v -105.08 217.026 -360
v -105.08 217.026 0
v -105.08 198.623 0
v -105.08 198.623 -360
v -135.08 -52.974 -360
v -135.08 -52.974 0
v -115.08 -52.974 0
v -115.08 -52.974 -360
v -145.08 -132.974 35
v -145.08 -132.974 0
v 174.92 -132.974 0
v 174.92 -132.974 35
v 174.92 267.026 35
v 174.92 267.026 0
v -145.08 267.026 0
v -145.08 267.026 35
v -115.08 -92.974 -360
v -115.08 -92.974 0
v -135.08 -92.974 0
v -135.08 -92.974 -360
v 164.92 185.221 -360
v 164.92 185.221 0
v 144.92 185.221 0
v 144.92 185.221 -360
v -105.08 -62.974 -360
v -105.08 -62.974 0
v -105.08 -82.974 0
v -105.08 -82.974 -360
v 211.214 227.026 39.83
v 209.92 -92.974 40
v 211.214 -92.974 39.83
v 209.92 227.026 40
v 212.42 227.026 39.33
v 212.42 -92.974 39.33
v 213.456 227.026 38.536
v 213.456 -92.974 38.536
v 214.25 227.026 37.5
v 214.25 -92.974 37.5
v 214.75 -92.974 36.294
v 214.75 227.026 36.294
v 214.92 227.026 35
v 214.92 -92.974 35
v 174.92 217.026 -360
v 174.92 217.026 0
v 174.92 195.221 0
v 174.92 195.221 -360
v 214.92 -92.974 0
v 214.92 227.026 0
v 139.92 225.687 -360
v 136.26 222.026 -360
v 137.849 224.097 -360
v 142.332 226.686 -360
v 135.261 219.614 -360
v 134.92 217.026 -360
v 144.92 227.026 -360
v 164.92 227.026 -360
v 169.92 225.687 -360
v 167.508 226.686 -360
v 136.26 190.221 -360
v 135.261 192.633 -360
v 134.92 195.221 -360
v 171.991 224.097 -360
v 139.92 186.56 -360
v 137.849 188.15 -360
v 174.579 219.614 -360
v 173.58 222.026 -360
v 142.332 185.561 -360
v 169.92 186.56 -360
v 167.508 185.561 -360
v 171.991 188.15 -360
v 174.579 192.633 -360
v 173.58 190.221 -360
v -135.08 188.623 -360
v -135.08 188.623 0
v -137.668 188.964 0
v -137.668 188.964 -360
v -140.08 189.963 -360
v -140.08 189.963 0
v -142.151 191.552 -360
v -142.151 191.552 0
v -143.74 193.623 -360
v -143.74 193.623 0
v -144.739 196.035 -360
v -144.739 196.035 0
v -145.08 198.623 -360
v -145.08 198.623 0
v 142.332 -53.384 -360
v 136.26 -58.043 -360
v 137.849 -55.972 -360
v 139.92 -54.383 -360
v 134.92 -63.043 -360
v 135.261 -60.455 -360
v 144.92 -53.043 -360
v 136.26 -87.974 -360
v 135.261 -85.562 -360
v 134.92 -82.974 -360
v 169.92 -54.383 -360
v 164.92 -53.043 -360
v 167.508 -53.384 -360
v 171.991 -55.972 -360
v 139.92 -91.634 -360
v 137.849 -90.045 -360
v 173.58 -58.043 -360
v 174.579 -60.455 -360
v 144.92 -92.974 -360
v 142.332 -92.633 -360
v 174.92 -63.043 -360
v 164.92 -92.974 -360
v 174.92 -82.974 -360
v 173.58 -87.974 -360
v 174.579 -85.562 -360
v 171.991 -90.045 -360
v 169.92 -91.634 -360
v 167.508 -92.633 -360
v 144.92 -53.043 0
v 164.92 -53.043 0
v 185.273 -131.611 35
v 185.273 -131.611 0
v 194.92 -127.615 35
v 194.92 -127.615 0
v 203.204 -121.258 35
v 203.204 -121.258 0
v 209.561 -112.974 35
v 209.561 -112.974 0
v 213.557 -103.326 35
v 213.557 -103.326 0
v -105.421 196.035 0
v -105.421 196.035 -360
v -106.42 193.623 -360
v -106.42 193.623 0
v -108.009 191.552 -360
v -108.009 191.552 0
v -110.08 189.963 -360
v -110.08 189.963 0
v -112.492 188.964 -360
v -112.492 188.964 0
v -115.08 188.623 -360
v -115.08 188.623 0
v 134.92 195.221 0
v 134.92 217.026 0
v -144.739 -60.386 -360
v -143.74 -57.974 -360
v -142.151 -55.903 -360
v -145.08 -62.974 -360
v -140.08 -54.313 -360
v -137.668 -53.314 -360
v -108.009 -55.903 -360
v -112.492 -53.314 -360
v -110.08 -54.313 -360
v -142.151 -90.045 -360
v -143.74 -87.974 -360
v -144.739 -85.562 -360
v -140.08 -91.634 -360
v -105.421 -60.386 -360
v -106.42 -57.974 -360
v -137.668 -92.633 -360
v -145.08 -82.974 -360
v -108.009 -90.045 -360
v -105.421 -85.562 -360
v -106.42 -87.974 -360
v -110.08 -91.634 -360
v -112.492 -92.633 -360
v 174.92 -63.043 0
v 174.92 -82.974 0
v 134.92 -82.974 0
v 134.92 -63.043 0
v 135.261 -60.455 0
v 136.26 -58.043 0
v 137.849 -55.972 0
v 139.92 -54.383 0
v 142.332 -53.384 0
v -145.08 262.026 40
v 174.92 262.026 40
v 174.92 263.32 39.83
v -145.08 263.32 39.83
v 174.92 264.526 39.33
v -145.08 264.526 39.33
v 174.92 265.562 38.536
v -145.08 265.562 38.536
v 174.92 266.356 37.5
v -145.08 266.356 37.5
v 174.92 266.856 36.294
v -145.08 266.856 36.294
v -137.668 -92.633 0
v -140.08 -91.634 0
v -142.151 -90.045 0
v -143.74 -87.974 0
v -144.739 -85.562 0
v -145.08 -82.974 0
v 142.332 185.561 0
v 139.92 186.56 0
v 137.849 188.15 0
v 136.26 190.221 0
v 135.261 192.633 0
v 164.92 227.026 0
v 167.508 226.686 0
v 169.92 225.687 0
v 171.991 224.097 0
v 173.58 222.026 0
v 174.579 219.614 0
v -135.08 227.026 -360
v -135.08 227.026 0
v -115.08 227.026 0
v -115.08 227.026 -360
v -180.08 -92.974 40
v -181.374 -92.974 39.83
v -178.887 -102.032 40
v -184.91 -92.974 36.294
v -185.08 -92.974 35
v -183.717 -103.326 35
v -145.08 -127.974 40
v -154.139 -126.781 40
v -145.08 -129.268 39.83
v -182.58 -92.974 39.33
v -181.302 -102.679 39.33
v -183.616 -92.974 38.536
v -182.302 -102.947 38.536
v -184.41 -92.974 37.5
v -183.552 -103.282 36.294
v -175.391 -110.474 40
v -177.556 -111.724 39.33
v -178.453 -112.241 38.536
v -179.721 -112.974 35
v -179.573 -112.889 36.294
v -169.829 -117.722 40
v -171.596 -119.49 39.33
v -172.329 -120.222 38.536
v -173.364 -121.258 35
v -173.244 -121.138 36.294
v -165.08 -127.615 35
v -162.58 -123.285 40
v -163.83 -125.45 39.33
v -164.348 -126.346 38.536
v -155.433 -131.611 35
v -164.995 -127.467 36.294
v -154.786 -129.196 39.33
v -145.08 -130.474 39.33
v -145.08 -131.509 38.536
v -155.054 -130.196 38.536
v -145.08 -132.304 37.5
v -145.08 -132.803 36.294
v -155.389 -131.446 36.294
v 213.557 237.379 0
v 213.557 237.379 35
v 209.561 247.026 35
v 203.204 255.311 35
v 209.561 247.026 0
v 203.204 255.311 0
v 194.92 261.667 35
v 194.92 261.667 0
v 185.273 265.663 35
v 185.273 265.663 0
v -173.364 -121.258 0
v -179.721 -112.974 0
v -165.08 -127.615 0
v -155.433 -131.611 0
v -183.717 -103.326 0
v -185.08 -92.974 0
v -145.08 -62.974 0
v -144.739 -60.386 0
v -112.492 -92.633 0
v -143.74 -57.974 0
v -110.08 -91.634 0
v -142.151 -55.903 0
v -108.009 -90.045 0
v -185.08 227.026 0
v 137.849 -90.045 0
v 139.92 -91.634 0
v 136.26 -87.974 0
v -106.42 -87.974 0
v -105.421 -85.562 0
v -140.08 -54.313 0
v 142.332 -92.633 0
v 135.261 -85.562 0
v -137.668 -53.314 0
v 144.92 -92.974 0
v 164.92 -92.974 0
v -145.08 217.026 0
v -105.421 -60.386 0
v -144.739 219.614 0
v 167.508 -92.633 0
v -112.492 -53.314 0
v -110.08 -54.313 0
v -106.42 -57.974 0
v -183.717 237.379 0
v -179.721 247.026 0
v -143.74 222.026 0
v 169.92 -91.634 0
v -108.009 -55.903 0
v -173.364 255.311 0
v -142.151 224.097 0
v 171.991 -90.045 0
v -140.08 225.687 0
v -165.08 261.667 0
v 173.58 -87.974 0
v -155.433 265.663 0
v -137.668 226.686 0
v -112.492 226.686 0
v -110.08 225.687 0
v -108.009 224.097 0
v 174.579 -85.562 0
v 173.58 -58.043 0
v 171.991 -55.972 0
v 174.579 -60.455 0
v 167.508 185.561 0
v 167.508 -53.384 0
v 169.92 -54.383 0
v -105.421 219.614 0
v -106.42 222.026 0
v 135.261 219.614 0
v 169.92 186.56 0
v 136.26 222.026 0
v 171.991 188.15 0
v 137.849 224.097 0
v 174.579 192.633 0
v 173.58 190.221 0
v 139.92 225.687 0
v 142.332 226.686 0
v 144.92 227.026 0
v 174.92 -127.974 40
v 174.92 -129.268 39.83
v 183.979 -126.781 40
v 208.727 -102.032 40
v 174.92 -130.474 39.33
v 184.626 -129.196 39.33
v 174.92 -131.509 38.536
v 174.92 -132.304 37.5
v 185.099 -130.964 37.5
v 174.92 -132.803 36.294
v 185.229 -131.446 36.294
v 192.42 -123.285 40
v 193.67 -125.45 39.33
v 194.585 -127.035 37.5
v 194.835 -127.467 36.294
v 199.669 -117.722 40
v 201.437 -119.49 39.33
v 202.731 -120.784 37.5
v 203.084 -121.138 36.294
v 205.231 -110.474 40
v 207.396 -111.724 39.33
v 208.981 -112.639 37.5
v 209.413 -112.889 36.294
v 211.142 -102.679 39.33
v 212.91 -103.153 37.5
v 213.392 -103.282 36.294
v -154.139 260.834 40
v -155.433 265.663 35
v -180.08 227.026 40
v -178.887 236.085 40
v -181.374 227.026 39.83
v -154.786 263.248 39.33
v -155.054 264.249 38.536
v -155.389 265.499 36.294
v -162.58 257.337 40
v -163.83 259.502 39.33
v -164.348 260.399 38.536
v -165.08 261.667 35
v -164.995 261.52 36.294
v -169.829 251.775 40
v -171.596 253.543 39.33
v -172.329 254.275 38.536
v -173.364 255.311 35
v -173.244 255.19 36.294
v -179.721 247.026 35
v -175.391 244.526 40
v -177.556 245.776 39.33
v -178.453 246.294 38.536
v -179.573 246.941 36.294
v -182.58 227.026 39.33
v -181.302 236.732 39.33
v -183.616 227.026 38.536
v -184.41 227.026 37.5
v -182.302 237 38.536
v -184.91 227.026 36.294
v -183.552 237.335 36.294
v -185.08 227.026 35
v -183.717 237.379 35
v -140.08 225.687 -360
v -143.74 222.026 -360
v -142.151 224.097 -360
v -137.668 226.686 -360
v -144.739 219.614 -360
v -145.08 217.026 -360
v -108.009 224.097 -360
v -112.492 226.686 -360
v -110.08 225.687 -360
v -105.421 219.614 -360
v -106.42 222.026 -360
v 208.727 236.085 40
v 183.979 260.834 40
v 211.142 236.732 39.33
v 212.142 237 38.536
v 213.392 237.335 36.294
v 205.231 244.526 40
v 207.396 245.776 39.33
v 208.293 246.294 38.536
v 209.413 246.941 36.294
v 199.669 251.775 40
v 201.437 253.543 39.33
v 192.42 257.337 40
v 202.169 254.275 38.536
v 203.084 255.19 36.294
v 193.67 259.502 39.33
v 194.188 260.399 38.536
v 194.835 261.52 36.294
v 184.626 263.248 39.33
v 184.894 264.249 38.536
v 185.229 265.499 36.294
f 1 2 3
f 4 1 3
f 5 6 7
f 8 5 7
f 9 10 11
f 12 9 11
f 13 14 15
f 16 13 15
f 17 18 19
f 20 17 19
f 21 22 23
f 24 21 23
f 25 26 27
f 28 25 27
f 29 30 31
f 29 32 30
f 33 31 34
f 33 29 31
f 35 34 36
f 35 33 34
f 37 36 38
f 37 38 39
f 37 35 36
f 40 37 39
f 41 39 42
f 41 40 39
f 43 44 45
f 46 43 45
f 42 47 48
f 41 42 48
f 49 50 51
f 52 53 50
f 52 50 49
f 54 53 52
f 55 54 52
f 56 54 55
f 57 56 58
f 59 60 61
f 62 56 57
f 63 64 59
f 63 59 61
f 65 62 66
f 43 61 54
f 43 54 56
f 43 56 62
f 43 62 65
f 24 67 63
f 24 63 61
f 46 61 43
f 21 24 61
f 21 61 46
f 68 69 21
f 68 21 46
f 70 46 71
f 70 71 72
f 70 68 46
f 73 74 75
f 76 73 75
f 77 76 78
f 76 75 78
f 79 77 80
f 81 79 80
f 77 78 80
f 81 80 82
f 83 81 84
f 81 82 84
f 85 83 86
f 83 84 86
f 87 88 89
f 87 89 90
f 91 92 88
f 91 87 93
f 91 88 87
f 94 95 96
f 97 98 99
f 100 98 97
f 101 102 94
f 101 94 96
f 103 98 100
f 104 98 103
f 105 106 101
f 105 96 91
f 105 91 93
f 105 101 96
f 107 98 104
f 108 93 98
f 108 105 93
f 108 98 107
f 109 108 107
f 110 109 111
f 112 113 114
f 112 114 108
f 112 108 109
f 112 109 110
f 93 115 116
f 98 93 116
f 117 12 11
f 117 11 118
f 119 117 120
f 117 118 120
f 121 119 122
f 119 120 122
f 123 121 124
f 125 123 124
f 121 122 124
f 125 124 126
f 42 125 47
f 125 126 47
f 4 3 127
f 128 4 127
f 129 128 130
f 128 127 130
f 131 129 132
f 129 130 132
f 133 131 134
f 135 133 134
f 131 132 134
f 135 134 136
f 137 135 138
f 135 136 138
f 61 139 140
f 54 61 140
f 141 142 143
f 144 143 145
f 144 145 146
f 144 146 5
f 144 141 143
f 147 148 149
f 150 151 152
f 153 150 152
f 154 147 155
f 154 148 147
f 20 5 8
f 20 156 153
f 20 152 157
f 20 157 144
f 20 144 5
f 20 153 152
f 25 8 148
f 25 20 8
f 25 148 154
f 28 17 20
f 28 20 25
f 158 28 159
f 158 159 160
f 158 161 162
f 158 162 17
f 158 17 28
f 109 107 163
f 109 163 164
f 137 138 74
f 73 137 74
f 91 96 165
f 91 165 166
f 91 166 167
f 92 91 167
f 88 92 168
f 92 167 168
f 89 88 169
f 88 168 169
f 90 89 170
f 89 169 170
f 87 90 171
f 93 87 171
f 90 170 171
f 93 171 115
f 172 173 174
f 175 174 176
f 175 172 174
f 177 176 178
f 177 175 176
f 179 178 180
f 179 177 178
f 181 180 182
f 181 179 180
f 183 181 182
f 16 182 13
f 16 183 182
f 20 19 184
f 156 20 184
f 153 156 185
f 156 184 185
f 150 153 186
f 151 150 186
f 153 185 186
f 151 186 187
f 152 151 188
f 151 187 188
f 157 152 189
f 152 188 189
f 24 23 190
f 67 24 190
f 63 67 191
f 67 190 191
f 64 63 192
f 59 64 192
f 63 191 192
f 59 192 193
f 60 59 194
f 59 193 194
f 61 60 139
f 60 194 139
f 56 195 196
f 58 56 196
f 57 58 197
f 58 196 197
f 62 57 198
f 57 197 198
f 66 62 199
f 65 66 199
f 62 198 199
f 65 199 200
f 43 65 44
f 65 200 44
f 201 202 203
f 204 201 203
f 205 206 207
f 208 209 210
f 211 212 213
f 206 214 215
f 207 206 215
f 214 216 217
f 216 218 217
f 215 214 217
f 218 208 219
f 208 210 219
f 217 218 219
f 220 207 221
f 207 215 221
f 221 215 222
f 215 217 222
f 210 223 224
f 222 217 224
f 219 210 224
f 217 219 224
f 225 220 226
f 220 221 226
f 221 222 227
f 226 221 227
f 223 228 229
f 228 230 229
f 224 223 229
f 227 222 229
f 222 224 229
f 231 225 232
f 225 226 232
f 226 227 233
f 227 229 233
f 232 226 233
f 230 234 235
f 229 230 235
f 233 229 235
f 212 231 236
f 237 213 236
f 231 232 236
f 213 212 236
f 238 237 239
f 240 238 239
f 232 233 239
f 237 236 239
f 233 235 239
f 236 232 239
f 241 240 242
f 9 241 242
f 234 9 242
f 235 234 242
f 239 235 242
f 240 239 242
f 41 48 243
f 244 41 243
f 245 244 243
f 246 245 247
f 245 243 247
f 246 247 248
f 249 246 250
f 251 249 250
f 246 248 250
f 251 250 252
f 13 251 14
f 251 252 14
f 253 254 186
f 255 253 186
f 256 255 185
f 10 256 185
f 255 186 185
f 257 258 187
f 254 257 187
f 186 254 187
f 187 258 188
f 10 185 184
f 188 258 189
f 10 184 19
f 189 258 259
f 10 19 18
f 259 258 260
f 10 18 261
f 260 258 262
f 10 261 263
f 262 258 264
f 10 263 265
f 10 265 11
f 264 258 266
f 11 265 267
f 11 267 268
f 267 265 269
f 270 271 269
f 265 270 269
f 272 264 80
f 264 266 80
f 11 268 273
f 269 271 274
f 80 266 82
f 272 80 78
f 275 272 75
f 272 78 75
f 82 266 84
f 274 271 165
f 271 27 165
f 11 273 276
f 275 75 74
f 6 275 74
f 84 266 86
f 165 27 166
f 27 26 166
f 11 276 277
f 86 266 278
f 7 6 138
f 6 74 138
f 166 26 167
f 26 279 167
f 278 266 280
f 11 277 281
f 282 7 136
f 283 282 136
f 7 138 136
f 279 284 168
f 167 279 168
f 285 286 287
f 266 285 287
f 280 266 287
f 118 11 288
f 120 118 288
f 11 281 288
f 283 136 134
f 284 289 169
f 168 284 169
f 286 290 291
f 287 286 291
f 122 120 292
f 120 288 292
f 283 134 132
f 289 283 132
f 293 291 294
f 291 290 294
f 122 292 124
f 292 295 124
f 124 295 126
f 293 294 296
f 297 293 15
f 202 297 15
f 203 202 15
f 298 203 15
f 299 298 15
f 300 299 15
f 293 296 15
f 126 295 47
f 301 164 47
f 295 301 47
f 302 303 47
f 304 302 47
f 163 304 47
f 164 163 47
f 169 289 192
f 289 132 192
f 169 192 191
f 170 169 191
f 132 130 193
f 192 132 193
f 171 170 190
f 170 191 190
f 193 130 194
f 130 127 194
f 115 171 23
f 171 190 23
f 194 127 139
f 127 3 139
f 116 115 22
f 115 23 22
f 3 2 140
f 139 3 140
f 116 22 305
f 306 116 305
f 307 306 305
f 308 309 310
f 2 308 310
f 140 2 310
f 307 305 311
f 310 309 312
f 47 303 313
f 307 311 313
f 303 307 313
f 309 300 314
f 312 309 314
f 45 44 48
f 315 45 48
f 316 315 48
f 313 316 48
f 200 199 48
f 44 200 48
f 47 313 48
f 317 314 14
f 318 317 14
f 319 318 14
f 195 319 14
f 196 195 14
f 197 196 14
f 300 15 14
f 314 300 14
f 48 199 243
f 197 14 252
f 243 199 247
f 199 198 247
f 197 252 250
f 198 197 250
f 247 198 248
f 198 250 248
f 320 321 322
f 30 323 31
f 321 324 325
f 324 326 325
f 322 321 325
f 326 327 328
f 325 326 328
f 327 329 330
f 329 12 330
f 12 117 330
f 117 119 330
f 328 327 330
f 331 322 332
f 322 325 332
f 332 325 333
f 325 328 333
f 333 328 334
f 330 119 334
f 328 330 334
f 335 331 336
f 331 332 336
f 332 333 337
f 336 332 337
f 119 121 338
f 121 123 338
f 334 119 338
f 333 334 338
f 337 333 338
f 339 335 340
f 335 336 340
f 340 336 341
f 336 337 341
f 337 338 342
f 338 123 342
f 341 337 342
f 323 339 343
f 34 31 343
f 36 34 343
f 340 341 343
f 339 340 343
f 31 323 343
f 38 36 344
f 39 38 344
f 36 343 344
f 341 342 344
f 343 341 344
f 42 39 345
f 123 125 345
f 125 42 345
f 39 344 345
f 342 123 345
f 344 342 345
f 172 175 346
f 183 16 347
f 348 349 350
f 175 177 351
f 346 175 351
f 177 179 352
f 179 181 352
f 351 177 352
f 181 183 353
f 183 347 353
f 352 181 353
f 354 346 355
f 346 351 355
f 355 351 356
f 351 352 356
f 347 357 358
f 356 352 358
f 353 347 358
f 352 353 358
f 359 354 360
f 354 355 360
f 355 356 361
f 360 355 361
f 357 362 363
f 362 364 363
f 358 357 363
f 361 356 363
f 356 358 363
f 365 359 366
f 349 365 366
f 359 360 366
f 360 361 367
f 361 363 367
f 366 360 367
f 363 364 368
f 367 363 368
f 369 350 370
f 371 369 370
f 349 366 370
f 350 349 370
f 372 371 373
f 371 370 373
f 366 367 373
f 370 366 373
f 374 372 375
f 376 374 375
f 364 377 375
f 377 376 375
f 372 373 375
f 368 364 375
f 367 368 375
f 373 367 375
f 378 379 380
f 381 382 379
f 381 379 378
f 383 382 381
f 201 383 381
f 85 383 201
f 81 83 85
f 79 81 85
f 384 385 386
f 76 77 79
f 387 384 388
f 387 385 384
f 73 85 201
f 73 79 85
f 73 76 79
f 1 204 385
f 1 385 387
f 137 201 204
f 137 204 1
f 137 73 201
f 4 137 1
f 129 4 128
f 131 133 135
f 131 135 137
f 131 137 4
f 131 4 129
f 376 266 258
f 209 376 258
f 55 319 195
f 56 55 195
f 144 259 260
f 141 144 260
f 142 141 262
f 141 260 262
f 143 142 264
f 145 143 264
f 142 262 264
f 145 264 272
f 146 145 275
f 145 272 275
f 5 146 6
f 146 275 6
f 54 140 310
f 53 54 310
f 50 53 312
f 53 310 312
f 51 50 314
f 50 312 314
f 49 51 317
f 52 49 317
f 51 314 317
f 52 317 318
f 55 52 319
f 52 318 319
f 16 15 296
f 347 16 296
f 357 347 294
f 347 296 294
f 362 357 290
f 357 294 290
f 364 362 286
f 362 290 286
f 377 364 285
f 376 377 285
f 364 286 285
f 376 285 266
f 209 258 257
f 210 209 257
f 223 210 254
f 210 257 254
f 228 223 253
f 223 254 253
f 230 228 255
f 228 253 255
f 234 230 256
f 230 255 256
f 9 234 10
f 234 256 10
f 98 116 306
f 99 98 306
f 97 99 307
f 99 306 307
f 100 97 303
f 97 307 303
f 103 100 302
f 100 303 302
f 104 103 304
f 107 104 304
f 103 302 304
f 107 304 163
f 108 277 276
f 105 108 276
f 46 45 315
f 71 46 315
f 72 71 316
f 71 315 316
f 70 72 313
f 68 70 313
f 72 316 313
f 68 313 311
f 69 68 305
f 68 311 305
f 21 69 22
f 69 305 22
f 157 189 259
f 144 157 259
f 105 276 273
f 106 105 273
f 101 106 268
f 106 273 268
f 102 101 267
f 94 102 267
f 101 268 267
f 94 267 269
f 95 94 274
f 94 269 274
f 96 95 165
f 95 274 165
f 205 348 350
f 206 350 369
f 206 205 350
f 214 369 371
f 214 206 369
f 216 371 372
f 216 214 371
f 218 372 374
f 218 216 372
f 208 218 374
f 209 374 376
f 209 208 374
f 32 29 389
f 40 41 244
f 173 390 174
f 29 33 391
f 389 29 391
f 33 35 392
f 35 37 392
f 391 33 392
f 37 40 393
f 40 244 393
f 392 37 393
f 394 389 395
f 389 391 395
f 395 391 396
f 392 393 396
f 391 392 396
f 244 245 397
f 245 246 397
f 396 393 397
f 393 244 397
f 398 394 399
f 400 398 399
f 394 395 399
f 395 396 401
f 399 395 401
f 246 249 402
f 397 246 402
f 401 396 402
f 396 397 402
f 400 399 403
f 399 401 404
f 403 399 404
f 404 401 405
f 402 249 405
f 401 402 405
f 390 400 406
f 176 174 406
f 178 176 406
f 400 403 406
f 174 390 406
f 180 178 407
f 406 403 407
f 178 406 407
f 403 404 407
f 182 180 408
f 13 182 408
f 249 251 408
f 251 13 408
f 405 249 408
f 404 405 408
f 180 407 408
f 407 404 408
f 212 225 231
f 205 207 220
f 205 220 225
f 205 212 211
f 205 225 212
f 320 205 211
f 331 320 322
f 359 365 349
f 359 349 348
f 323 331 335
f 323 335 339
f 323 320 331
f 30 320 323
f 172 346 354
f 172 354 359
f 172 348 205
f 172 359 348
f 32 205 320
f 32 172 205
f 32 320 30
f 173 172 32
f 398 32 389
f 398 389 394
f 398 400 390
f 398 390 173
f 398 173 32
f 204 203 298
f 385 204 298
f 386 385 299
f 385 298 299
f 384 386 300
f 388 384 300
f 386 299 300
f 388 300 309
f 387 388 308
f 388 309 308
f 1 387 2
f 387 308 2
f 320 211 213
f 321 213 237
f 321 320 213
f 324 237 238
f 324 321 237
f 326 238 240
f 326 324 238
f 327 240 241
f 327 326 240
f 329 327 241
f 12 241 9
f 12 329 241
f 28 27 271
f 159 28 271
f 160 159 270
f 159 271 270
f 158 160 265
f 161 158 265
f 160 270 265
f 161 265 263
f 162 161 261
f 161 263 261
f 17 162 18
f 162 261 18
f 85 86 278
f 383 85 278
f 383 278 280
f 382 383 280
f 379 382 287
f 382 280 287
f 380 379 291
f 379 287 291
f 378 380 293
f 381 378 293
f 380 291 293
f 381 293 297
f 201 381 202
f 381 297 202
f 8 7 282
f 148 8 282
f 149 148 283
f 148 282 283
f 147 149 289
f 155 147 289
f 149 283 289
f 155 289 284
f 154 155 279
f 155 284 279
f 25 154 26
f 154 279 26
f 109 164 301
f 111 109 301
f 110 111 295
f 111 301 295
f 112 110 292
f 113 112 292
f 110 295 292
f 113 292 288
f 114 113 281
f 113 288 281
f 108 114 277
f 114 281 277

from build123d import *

# Parameters (mm, degrees)
F1_DEPTH = 40
F3_DEPTH = 360
F4_R     = 5


with BuildPart() as f1:
    # F0 (on Top) → F1 (new body)
    with BuildSketch(Plane.XY):
        with BuildLine():
            Line((174.920015, 267.026268), (-145.079985, 267.026268))
            ThreePointArc((-145.079985, 267.026268), (-173.364256, 255.310539), (-185.079985, 227.026268))
            Line((-185.079985, 227.026268), (-185.079985, -92.973732))
            ThreePointArc((-185.079985, -92.973732), (-173.364256, -121.258003), (-145.079985, -132.973732))
            Line((-145.079985, -132.973732), (174.920015, -132.973732))
            ThreePointArc((174.920015, -132.973732), (203.204286, -121.258003), (214.920015, -92.973732))
            Line((214.920015, -92.973732), (214.920015, 227.026268))
            ThreePointArc((214.920015, 227.026268), (203.204286, 255.310539), (174.920015, 267.026268))
        make_face()
    extrude(amount=F1_DEPTH)

    # F2 (on face) → F3 (join)
    with BuildSketch(Plane(origin=(0, 0, 0), x_dir=(1, 0, 0), z_dir=(0, 0, -1))):
        with BuildLine():
            ThreePointArc((-145.079985, 62.973732), (-142.151053, 55.902664), (-135.079985, 52.973732))
            Line((-135.079985, 52.973732), (-115.079985, 52.973732))
            ThreePointArc((-115.079985, 52.973732), (-108.008917, 55.902664), (-105.079985, 62.973732))
            Line((-105.079985, 62.973732), (-105.079985, 82.973732))
            ThreePointArc((-105.079985, 82.973732), (-108.008917, 90.0448), (-115.079985, 92.973732))
            Line((-115.079985, 92.973732), (-135.079985, 92.973732))
            ThreePointArc((-135.079985, 92.973732), (-142.151053, 90.0448), (-145.079985, 82.973732))
            Line((-145.079985, 82.973732), (-145.079985, 62.973732))
        make_face()
        with BuildLine():
            Line((-115.079985, -188.623472), (-135.079985, -188.623472))
            ThreePointArc((-135.079985, -188.623472), (-142.151053, -191.552404), (-145.079985, -198.623472))
            Line((-145.079985, -198.623472), (-145.079985, -217.026268))
            ThreePointArc((-145.079985, -217.026268), (-142.151053, -224.097336), (-135.079985, -227.026268))
            Line((-135.079985, -227.026268), (-115.079985, -227.026268))
            ThreePointArc((-115.079985, -227.026268), (-108.008917, -224.097336), (-105.079985, -217.026268))
            Line((-105.079985, -217.026268), (-105.079985, -198.623472))
            ThreePointArc((-105.079985, -198.623472), (-108.008917, -191.552404), (-115.079985, -188.623472))
        make_face()
        with BuildLine():
            ThreePointArc((174.920015, -195.220733), (171.991083, -188.149665), (164.920015, -185.220733))
            Line((164.920015, -185.220733), (144.920015, -185.220733))
            ThreePointArc((144.920015, -185.220733), (137.848947, -188.149665), (134.920015, -195.220733))
            Line((134.920015, -195.220733), (134.920015, -217.026268))
            ThreePointArc((134.920015, -217.026268), (137.848947, -224.097336), (144.920015, -227.026268))
            Line((144.920015, -227.026268), (164.920015, -227.026268))
            ThreePointArc((164.920015, -227.026268), (171.991083, -224.097336), (174.920015, -217.026268))
            Line((174.920015, -217.026268), (174.920015, -195.220733))
        make_face()
        with BuildLine():
            Line((164.920015, 92.973732), (144.920015, 92.973732))
            ThreePointArc((144.920015, 92.973732), (137.848947, 90.0448), (134.920015, 82.973732))
            Line((134.920015, 82.973732), (134.920015, 63.043179))
            ThreePointArc((134.920015, 63.043179), (137.848947, 55.972111), (144.920015, 53.043179))
            Line((144.920015, 53.043179), (164.920015, 53.043179))
            ThreePointArc((164.920015, 53.043179), (171.991083, 55.972111), (174.920015, 63.043179))
            Line((174.920015, 63.043179), (174.920015, 82.973732))
            ThreePointArc((174.920015, 82.973732), (171.991083, 90.0448), (164.920015, 92.973732))
        make_face()
    extrude(amount=F3_DEPTH)

    # F4
    f4_edges = [f1.edges().sort_by_distance(p)[0] for p in [
        (214.920015, 67.026268, 40),
        (203.204286, 255.310539, 40),
        (14.920015, 267.026268, 40),
        (-173.364256, 255.310539, 40),
        (-185.079985, 67.026268, 40),
        (-173.364256, -121.258003, 40),
        (14.920015, -132.973732, 40),
        (203.204286, -121.258003, 40),
    ]]
    fillet(f4_edges, radius=F4_R)


solid = f1.part
